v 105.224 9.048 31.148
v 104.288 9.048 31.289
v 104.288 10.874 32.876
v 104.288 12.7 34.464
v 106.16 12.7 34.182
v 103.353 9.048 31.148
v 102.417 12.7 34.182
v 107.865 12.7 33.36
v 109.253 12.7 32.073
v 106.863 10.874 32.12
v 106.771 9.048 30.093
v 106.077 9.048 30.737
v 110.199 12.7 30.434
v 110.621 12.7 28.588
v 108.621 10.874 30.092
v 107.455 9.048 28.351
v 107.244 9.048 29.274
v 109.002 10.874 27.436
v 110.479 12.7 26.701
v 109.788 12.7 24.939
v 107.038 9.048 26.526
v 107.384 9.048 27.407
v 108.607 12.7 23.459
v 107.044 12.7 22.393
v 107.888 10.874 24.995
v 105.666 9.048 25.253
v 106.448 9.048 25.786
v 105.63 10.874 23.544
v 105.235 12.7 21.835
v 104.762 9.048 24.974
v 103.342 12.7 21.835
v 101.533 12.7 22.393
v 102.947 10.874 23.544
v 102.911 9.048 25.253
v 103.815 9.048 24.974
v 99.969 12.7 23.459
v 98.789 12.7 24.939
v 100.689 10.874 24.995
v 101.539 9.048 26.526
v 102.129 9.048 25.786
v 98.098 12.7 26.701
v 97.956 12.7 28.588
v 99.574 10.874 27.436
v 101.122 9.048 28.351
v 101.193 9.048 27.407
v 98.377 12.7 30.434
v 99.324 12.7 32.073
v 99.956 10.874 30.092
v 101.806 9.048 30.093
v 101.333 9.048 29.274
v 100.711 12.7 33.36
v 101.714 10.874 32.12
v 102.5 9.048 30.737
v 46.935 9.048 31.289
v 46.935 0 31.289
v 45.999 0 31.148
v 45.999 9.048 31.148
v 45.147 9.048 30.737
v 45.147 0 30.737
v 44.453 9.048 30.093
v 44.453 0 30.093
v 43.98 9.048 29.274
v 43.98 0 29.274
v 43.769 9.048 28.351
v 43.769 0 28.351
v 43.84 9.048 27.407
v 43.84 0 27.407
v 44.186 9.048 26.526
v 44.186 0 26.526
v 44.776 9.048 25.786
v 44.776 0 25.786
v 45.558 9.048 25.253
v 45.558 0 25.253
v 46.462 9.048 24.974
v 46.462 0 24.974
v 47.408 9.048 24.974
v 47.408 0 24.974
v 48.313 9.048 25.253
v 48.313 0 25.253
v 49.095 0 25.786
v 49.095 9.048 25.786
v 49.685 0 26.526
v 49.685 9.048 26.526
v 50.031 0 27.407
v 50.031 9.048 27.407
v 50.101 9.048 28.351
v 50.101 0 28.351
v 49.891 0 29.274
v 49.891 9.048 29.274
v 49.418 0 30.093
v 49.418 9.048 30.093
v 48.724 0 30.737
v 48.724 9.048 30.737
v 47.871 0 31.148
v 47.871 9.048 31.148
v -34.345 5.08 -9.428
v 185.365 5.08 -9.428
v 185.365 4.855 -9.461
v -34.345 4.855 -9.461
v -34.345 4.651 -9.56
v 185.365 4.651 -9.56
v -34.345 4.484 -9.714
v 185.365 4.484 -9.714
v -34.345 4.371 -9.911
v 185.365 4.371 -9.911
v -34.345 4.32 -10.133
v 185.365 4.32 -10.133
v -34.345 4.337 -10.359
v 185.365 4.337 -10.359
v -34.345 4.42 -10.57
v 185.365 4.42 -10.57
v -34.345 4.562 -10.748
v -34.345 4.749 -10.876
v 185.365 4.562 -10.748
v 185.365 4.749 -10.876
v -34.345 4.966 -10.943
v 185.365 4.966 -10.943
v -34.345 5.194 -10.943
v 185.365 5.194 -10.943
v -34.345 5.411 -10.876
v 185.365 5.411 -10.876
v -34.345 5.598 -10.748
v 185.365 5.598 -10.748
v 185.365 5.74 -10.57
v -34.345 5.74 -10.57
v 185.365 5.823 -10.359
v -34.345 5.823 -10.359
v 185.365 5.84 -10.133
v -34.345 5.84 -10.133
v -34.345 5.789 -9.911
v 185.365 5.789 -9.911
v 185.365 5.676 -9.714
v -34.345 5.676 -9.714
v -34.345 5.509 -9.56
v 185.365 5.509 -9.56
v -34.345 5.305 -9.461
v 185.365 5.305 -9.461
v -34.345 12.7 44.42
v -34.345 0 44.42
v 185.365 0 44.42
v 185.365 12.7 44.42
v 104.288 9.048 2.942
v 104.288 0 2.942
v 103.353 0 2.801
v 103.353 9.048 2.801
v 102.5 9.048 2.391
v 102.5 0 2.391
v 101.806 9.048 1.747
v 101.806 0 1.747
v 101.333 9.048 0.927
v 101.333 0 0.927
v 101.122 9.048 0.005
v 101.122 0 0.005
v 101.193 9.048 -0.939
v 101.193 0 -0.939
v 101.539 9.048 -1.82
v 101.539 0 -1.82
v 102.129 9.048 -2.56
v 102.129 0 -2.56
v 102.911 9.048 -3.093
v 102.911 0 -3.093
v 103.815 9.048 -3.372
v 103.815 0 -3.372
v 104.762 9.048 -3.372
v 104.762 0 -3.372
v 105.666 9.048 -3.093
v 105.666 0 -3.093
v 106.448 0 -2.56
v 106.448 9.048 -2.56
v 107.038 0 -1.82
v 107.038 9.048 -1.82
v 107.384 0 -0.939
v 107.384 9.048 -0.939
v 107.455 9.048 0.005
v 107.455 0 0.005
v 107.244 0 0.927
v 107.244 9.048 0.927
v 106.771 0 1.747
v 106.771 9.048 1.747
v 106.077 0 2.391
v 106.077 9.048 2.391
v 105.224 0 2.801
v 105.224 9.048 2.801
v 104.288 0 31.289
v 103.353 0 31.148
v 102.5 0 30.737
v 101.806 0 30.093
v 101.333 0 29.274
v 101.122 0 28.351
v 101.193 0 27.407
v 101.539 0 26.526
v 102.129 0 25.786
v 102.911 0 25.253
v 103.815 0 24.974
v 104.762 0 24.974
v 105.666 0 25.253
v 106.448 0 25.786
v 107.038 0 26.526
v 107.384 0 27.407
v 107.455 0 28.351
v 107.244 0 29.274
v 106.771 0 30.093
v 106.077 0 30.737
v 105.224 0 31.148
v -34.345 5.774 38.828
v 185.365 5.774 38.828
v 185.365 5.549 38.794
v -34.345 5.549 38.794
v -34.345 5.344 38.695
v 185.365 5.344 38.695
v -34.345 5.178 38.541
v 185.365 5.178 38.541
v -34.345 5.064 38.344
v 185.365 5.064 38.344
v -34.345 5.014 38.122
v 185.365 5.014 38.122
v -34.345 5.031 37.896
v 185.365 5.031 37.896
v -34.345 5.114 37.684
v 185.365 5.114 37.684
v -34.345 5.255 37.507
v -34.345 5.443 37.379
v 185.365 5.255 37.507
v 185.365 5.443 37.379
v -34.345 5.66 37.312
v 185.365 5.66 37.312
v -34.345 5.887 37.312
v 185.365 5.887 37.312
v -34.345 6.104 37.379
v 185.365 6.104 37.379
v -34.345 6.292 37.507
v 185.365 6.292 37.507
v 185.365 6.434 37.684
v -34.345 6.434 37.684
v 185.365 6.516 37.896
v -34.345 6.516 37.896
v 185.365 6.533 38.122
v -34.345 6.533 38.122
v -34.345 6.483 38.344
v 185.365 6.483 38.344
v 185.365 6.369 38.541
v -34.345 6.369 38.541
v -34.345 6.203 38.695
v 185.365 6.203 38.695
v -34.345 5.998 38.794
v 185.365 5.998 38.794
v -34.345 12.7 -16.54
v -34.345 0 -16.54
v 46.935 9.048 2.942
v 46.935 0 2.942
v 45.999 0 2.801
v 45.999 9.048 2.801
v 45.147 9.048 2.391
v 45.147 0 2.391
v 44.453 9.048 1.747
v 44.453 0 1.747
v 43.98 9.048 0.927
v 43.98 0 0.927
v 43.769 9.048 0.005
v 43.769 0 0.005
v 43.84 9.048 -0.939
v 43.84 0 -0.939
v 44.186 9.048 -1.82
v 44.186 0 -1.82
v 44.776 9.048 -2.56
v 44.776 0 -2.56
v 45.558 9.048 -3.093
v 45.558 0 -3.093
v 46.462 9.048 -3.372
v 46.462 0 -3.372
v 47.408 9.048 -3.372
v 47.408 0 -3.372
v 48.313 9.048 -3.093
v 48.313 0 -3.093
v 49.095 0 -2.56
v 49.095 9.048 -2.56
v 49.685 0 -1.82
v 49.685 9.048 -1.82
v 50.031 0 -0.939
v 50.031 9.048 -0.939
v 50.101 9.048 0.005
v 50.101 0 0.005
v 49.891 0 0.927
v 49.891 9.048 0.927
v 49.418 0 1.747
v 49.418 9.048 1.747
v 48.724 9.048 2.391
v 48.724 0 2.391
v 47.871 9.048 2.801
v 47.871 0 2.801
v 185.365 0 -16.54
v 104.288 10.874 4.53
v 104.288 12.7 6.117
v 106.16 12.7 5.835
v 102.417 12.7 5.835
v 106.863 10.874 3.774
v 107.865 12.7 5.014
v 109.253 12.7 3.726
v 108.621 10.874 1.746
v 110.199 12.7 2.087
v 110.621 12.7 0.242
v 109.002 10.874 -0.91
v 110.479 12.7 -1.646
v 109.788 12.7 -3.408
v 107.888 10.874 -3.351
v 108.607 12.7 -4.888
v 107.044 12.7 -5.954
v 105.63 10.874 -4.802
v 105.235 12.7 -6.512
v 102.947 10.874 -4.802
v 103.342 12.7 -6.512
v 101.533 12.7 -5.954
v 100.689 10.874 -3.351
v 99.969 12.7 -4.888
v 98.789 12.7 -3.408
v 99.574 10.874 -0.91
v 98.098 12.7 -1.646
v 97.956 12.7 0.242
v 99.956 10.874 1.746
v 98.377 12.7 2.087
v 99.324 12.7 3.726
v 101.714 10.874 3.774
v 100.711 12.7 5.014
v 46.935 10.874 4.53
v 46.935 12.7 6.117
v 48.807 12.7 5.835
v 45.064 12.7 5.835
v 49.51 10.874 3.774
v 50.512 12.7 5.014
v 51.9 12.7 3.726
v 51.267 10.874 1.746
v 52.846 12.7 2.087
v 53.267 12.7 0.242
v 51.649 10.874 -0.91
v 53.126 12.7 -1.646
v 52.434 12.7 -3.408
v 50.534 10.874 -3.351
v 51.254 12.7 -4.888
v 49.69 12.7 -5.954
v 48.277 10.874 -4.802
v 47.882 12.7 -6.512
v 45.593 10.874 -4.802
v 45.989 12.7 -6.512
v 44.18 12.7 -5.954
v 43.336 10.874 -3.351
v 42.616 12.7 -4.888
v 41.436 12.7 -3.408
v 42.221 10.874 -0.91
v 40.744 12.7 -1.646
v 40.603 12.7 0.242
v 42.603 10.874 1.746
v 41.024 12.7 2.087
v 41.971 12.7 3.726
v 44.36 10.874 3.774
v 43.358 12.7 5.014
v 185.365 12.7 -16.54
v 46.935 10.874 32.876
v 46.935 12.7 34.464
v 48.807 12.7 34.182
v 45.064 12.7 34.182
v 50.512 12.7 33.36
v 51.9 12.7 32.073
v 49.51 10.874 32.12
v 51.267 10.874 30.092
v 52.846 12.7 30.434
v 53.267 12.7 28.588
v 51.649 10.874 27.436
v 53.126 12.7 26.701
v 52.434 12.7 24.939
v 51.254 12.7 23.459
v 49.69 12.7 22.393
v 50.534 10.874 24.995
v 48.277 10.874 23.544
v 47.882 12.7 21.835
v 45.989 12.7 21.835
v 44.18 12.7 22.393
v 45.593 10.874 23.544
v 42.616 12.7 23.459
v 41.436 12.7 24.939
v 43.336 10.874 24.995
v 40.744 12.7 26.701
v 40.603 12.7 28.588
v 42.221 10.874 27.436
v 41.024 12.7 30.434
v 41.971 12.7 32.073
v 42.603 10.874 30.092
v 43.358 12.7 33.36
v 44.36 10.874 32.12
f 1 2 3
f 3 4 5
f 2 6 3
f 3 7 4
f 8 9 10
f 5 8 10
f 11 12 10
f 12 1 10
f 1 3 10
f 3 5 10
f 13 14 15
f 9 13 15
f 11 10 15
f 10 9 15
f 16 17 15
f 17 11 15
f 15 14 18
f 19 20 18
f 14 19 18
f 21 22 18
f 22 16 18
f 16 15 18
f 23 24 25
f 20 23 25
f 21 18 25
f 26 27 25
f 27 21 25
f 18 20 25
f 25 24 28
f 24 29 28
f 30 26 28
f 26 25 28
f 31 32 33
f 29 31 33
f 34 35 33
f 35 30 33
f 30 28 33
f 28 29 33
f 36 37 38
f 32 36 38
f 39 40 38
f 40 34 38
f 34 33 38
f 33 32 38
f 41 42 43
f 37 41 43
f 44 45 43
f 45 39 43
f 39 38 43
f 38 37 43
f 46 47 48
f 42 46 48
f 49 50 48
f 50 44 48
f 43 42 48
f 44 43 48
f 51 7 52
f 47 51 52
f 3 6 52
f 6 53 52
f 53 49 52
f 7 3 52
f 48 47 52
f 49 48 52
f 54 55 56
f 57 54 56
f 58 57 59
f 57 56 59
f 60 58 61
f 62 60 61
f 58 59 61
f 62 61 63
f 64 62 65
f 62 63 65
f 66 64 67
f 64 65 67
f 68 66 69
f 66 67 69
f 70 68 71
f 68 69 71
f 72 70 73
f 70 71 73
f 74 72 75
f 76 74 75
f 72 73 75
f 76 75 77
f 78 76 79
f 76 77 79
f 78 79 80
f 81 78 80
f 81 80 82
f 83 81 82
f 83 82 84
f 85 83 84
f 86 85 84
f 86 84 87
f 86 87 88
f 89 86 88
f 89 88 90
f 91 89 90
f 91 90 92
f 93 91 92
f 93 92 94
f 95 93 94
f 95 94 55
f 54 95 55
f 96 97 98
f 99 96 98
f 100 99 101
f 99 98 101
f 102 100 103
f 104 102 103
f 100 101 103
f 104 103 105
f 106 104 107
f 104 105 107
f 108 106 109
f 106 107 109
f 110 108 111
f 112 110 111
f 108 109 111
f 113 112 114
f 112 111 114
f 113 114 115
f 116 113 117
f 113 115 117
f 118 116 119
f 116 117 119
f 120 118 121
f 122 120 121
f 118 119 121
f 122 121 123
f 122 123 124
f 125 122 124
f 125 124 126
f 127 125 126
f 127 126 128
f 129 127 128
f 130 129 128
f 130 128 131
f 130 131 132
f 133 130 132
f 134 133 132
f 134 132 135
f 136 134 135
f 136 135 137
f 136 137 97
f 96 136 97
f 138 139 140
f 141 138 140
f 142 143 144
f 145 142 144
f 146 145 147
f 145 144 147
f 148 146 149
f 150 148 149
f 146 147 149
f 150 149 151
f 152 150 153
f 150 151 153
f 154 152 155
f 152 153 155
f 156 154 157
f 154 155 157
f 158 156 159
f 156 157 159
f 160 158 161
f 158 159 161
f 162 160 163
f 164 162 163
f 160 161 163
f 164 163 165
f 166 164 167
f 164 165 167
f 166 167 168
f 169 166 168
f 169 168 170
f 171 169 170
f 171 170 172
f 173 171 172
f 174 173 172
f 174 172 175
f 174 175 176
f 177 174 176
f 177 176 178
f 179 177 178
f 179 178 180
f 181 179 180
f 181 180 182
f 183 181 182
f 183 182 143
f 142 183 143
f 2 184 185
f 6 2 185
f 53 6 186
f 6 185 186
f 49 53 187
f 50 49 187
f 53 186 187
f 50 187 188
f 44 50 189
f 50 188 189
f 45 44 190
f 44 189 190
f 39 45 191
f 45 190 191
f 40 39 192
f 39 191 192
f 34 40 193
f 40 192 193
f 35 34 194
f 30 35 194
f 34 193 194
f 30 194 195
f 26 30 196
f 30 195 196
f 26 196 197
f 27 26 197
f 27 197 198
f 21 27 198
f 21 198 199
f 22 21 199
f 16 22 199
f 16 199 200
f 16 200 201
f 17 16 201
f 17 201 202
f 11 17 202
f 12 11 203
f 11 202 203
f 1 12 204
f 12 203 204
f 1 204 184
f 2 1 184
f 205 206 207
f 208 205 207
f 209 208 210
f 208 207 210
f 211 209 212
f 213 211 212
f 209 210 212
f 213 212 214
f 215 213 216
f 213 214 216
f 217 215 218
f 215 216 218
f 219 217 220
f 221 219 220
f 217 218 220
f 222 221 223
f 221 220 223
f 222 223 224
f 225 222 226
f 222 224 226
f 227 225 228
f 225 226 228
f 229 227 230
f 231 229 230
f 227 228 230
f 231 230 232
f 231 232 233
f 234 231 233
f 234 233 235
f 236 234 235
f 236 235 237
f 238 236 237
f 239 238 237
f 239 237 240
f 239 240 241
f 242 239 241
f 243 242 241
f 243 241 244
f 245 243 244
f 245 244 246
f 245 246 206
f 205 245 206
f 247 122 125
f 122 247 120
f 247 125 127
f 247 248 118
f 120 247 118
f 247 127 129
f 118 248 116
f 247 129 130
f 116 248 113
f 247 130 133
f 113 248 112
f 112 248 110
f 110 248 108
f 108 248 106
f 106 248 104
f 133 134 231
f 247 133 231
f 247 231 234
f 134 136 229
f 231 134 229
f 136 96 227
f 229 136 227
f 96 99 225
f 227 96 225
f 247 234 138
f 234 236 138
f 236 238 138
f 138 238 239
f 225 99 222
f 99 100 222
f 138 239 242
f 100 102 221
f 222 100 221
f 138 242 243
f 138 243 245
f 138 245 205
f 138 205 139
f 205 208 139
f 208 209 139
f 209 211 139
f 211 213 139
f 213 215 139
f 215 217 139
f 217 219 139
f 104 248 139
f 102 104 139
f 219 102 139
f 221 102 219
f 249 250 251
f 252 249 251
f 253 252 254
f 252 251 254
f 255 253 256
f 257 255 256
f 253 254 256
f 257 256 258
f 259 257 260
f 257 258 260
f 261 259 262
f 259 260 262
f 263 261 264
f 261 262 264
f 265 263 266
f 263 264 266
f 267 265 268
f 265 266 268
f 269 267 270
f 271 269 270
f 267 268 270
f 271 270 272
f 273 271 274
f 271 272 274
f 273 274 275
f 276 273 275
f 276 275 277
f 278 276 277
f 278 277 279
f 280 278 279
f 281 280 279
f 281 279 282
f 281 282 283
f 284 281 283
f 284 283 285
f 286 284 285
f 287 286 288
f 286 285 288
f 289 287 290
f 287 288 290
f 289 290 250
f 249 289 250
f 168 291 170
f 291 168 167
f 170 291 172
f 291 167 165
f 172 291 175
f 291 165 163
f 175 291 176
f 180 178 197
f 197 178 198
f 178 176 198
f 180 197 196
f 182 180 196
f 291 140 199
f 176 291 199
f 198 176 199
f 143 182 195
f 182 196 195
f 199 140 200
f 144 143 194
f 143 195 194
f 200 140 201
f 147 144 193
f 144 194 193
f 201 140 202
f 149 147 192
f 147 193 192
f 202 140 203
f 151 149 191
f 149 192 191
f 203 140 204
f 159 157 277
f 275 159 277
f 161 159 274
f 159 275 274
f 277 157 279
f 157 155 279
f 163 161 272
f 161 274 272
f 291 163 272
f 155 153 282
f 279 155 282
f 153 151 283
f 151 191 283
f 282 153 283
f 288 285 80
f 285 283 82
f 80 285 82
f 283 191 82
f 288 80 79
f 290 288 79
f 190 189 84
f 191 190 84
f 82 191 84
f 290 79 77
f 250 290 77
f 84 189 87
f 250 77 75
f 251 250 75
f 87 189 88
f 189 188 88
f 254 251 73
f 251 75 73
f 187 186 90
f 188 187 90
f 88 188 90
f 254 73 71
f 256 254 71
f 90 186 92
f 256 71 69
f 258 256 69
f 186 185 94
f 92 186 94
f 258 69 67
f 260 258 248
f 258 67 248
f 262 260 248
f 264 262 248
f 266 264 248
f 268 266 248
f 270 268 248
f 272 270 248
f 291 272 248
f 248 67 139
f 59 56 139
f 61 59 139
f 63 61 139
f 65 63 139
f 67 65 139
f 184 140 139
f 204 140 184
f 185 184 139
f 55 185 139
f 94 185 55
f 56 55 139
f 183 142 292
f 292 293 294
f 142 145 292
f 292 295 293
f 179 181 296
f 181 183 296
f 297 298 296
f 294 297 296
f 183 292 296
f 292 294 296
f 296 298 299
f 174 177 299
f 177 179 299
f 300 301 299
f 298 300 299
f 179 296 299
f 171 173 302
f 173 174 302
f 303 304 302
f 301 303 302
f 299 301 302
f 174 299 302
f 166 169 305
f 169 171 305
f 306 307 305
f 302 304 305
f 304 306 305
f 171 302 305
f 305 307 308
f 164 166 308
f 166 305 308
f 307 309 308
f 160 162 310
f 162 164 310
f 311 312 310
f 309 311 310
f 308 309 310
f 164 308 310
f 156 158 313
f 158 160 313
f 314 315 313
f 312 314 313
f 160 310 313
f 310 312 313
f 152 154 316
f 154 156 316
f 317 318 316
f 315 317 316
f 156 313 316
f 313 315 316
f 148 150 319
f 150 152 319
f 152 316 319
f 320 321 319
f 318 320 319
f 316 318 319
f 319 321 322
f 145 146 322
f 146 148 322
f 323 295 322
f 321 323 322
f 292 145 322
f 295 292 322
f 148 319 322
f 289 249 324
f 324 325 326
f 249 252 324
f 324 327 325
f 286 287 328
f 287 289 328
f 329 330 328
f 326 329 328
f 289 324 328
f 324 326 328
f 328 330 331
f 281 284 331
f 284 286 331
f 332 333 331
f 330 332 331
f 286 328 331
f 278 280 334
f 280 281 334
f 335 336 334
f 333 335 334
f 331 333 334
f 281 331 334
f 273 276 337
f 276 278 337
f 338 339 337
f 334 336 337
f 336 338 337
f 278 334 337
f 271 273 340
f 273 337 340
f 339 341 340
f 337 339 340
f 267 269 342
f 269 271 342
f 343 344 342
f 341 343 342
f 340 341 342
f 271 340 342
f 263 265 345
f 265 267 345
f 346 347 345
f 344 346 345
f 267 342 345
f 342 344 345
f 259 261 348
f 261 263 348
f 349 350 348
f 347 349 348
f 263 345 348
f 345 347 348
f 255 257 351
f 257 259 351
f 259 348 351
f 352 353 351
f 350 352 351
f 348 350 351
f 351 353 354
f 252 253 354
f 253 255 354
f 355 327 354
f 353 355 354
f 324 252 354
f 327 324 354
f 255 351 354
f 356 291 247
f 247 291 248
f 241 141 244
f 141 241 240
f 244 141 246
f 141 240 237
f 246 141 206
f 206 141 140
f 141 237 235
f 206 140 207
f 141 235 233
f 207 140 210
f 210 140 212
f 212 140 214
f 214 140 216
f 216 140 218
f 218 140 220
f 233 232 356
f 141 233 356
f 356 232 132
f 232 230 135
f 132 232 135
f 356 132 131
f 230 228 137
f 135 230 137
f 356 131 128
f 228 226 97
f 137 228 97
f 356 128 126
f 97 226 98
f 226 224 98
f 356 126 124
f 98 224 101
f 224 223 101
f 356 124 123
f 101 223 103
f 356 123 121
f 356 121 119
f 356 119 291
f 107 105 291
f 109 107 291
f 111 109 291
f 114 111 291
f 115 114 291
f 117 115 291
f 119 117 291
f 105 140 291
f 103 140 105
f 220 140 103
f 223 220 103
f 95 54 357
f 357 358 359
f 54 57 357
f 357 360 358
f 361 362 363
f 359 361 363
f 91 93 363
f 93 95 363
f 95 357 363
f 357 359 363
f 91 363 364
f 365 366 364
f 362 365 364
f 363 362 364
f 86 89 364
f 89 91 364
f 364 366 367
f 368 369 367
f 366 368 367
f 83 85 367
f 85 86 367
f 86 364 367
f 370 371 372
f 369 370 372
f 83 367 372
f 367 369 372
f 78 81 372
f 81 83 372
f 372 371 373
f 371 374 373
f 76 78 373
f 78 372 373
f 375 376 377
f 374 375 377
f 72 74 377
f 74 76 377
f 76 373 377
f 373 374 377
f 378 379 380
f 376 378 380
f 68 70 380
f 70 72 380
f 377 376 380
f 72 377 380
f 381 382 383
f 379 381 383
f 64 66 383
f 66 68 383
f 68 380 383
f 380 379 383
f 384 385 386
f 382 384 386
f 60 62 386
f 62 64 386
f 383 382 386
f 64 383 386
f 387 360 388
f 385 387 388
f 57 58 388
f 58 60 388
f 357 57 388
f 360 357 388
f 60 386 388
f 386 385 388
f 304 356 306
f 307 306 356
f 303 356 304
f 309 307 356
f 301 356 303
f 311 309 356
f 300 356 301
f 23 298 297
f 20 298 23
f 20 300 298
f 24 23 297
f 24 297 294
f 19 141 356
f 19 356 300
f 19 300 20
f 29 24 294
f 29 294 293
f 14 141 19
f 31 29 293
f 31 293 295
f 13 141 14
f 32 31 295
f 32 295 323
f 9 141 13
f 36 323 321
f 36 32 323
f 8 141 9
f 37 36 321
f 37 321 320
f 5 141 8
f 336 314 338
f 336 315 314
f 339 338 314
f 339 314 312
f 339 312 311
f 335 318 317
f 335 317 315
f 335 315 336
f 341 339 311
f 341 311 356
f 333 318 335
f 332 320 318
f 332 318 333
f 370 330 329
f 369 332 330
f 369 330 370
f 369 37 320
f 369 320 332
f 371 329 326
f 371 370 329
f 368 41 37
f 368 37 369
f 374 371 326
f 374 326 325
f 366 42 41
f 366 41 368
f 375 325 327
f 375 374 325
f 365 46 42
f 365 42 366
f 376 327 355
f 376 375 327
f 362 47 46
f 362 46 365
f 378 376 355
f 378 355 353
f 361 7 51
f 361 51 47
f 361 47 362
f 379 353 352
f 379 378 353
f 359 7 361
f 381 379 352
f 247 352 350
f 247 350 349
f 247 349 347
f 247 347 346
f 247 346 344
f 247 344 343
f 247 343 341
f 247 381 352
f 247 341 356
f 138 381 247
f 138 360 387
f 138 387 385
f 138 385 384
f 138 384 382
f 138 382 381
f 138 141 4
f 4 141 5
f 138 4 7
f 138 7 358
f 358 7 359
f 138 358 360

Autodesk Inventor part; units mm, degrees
ref_plane "YZ Plane" through (0, 0, 0) normal (1, 0, 0) x (0, 1, 0)
ref_plane "XZ Plane" through (0, 0, 0) normal (0, 1, 0) x (-1, 0, 0)
ref_plane "XY Plane" through (0, 0, 0) normal (0, 0, 1) x (1, 0, 0)
sketch "Sketch1" plane through (0, 0, 0) normal (0, 1, 0) x (-1, 0, 0)
  line L0 (34.3448, 44.4205) -> (-185.3652, 44.4205)
  line L1 (-185.3652, 44.4205) -> (-185.3652, -16.5395)
  line L2 (-185.3652, -16.5395) -> (34.3448, -16.5395)
  line L3 (34.3448, -16.5395) -> (34.3448, 44.4205)
  point P0 (0, 0)
  dimension "d0" = 60.96
  dimension "d1" = 219.71
extrude "Extrusion1" add sketch "Sketch1" along normal blind 12.7
sketch "Sketch2" plane through (0, 12.7, 0) normal (0, 1, 0) x (1, 0, 0)
  line L0 (-34.3448, -44.4205) -> (185.3652, -44.4205) projected
  line L1 (185.3652, 16.5395) -> (-34.3448, 16.5395) projected
  line L2 (-34.3448, 16.5395) -> (-34.3448, -44.4205) projected
  line L3 (185.3652, -44.4205) -> (185.3652, 16.5395) projected
  point P0 (0, 0)
  point P1 (46.9352, -28.1137)
  point P2 (46.9352, 0.2327)
  point P3 (104.2884, 0.2327)
  point P4 (104.2884, -28.1137)
  dimension "d4" = 28.3464
  dimension "d5" = 0
  dimension "d6" = 0
  dimension "d7" = 16.3068
  dimension "d8" = 16.3068
  dimension "d9" = 57.3532
  dimension "d10" = 0
  dimension "d11" = 0
  dimension "d12" = 81.28
  dimension "d13" = 81.0768
hole "Hole1" at (46.9352, 12.7, 28.1137) at (46.9352, 12.7, -0.2327) at (104.2884, 12.7, -0.2327) at (104.2884, 12.7, 28.1137) direction (0, -1, 0) diameter 6.35 end through all countersink diameter 12.7 countersink angle 82
sketch "Sketch5" plane through (-34.3448, 0, -16.5395) normal (-1, 0, 0) x (0, 0, 1)
  line L0 (0, 0) -> (0, 12.7) projected
  line L1 (0, 12.7) -> (60.96, 12.7) projected
  point P0 (16.5395, 0)
  point P1 (54.605, 5.7736)
  point P2 (6.35, 5.08)
  dimension "d21" = 48.26
  dimension "d22" = 6.35
  dimension "d23" = 7.62
hole "Hole2" at (-34.3448, 5.7736, 38.0655) at (-34.3448, 5.08, -10.1895) direction (1, 0, 0) diameter 1.524 end through all
properties part number "TopPlate"
